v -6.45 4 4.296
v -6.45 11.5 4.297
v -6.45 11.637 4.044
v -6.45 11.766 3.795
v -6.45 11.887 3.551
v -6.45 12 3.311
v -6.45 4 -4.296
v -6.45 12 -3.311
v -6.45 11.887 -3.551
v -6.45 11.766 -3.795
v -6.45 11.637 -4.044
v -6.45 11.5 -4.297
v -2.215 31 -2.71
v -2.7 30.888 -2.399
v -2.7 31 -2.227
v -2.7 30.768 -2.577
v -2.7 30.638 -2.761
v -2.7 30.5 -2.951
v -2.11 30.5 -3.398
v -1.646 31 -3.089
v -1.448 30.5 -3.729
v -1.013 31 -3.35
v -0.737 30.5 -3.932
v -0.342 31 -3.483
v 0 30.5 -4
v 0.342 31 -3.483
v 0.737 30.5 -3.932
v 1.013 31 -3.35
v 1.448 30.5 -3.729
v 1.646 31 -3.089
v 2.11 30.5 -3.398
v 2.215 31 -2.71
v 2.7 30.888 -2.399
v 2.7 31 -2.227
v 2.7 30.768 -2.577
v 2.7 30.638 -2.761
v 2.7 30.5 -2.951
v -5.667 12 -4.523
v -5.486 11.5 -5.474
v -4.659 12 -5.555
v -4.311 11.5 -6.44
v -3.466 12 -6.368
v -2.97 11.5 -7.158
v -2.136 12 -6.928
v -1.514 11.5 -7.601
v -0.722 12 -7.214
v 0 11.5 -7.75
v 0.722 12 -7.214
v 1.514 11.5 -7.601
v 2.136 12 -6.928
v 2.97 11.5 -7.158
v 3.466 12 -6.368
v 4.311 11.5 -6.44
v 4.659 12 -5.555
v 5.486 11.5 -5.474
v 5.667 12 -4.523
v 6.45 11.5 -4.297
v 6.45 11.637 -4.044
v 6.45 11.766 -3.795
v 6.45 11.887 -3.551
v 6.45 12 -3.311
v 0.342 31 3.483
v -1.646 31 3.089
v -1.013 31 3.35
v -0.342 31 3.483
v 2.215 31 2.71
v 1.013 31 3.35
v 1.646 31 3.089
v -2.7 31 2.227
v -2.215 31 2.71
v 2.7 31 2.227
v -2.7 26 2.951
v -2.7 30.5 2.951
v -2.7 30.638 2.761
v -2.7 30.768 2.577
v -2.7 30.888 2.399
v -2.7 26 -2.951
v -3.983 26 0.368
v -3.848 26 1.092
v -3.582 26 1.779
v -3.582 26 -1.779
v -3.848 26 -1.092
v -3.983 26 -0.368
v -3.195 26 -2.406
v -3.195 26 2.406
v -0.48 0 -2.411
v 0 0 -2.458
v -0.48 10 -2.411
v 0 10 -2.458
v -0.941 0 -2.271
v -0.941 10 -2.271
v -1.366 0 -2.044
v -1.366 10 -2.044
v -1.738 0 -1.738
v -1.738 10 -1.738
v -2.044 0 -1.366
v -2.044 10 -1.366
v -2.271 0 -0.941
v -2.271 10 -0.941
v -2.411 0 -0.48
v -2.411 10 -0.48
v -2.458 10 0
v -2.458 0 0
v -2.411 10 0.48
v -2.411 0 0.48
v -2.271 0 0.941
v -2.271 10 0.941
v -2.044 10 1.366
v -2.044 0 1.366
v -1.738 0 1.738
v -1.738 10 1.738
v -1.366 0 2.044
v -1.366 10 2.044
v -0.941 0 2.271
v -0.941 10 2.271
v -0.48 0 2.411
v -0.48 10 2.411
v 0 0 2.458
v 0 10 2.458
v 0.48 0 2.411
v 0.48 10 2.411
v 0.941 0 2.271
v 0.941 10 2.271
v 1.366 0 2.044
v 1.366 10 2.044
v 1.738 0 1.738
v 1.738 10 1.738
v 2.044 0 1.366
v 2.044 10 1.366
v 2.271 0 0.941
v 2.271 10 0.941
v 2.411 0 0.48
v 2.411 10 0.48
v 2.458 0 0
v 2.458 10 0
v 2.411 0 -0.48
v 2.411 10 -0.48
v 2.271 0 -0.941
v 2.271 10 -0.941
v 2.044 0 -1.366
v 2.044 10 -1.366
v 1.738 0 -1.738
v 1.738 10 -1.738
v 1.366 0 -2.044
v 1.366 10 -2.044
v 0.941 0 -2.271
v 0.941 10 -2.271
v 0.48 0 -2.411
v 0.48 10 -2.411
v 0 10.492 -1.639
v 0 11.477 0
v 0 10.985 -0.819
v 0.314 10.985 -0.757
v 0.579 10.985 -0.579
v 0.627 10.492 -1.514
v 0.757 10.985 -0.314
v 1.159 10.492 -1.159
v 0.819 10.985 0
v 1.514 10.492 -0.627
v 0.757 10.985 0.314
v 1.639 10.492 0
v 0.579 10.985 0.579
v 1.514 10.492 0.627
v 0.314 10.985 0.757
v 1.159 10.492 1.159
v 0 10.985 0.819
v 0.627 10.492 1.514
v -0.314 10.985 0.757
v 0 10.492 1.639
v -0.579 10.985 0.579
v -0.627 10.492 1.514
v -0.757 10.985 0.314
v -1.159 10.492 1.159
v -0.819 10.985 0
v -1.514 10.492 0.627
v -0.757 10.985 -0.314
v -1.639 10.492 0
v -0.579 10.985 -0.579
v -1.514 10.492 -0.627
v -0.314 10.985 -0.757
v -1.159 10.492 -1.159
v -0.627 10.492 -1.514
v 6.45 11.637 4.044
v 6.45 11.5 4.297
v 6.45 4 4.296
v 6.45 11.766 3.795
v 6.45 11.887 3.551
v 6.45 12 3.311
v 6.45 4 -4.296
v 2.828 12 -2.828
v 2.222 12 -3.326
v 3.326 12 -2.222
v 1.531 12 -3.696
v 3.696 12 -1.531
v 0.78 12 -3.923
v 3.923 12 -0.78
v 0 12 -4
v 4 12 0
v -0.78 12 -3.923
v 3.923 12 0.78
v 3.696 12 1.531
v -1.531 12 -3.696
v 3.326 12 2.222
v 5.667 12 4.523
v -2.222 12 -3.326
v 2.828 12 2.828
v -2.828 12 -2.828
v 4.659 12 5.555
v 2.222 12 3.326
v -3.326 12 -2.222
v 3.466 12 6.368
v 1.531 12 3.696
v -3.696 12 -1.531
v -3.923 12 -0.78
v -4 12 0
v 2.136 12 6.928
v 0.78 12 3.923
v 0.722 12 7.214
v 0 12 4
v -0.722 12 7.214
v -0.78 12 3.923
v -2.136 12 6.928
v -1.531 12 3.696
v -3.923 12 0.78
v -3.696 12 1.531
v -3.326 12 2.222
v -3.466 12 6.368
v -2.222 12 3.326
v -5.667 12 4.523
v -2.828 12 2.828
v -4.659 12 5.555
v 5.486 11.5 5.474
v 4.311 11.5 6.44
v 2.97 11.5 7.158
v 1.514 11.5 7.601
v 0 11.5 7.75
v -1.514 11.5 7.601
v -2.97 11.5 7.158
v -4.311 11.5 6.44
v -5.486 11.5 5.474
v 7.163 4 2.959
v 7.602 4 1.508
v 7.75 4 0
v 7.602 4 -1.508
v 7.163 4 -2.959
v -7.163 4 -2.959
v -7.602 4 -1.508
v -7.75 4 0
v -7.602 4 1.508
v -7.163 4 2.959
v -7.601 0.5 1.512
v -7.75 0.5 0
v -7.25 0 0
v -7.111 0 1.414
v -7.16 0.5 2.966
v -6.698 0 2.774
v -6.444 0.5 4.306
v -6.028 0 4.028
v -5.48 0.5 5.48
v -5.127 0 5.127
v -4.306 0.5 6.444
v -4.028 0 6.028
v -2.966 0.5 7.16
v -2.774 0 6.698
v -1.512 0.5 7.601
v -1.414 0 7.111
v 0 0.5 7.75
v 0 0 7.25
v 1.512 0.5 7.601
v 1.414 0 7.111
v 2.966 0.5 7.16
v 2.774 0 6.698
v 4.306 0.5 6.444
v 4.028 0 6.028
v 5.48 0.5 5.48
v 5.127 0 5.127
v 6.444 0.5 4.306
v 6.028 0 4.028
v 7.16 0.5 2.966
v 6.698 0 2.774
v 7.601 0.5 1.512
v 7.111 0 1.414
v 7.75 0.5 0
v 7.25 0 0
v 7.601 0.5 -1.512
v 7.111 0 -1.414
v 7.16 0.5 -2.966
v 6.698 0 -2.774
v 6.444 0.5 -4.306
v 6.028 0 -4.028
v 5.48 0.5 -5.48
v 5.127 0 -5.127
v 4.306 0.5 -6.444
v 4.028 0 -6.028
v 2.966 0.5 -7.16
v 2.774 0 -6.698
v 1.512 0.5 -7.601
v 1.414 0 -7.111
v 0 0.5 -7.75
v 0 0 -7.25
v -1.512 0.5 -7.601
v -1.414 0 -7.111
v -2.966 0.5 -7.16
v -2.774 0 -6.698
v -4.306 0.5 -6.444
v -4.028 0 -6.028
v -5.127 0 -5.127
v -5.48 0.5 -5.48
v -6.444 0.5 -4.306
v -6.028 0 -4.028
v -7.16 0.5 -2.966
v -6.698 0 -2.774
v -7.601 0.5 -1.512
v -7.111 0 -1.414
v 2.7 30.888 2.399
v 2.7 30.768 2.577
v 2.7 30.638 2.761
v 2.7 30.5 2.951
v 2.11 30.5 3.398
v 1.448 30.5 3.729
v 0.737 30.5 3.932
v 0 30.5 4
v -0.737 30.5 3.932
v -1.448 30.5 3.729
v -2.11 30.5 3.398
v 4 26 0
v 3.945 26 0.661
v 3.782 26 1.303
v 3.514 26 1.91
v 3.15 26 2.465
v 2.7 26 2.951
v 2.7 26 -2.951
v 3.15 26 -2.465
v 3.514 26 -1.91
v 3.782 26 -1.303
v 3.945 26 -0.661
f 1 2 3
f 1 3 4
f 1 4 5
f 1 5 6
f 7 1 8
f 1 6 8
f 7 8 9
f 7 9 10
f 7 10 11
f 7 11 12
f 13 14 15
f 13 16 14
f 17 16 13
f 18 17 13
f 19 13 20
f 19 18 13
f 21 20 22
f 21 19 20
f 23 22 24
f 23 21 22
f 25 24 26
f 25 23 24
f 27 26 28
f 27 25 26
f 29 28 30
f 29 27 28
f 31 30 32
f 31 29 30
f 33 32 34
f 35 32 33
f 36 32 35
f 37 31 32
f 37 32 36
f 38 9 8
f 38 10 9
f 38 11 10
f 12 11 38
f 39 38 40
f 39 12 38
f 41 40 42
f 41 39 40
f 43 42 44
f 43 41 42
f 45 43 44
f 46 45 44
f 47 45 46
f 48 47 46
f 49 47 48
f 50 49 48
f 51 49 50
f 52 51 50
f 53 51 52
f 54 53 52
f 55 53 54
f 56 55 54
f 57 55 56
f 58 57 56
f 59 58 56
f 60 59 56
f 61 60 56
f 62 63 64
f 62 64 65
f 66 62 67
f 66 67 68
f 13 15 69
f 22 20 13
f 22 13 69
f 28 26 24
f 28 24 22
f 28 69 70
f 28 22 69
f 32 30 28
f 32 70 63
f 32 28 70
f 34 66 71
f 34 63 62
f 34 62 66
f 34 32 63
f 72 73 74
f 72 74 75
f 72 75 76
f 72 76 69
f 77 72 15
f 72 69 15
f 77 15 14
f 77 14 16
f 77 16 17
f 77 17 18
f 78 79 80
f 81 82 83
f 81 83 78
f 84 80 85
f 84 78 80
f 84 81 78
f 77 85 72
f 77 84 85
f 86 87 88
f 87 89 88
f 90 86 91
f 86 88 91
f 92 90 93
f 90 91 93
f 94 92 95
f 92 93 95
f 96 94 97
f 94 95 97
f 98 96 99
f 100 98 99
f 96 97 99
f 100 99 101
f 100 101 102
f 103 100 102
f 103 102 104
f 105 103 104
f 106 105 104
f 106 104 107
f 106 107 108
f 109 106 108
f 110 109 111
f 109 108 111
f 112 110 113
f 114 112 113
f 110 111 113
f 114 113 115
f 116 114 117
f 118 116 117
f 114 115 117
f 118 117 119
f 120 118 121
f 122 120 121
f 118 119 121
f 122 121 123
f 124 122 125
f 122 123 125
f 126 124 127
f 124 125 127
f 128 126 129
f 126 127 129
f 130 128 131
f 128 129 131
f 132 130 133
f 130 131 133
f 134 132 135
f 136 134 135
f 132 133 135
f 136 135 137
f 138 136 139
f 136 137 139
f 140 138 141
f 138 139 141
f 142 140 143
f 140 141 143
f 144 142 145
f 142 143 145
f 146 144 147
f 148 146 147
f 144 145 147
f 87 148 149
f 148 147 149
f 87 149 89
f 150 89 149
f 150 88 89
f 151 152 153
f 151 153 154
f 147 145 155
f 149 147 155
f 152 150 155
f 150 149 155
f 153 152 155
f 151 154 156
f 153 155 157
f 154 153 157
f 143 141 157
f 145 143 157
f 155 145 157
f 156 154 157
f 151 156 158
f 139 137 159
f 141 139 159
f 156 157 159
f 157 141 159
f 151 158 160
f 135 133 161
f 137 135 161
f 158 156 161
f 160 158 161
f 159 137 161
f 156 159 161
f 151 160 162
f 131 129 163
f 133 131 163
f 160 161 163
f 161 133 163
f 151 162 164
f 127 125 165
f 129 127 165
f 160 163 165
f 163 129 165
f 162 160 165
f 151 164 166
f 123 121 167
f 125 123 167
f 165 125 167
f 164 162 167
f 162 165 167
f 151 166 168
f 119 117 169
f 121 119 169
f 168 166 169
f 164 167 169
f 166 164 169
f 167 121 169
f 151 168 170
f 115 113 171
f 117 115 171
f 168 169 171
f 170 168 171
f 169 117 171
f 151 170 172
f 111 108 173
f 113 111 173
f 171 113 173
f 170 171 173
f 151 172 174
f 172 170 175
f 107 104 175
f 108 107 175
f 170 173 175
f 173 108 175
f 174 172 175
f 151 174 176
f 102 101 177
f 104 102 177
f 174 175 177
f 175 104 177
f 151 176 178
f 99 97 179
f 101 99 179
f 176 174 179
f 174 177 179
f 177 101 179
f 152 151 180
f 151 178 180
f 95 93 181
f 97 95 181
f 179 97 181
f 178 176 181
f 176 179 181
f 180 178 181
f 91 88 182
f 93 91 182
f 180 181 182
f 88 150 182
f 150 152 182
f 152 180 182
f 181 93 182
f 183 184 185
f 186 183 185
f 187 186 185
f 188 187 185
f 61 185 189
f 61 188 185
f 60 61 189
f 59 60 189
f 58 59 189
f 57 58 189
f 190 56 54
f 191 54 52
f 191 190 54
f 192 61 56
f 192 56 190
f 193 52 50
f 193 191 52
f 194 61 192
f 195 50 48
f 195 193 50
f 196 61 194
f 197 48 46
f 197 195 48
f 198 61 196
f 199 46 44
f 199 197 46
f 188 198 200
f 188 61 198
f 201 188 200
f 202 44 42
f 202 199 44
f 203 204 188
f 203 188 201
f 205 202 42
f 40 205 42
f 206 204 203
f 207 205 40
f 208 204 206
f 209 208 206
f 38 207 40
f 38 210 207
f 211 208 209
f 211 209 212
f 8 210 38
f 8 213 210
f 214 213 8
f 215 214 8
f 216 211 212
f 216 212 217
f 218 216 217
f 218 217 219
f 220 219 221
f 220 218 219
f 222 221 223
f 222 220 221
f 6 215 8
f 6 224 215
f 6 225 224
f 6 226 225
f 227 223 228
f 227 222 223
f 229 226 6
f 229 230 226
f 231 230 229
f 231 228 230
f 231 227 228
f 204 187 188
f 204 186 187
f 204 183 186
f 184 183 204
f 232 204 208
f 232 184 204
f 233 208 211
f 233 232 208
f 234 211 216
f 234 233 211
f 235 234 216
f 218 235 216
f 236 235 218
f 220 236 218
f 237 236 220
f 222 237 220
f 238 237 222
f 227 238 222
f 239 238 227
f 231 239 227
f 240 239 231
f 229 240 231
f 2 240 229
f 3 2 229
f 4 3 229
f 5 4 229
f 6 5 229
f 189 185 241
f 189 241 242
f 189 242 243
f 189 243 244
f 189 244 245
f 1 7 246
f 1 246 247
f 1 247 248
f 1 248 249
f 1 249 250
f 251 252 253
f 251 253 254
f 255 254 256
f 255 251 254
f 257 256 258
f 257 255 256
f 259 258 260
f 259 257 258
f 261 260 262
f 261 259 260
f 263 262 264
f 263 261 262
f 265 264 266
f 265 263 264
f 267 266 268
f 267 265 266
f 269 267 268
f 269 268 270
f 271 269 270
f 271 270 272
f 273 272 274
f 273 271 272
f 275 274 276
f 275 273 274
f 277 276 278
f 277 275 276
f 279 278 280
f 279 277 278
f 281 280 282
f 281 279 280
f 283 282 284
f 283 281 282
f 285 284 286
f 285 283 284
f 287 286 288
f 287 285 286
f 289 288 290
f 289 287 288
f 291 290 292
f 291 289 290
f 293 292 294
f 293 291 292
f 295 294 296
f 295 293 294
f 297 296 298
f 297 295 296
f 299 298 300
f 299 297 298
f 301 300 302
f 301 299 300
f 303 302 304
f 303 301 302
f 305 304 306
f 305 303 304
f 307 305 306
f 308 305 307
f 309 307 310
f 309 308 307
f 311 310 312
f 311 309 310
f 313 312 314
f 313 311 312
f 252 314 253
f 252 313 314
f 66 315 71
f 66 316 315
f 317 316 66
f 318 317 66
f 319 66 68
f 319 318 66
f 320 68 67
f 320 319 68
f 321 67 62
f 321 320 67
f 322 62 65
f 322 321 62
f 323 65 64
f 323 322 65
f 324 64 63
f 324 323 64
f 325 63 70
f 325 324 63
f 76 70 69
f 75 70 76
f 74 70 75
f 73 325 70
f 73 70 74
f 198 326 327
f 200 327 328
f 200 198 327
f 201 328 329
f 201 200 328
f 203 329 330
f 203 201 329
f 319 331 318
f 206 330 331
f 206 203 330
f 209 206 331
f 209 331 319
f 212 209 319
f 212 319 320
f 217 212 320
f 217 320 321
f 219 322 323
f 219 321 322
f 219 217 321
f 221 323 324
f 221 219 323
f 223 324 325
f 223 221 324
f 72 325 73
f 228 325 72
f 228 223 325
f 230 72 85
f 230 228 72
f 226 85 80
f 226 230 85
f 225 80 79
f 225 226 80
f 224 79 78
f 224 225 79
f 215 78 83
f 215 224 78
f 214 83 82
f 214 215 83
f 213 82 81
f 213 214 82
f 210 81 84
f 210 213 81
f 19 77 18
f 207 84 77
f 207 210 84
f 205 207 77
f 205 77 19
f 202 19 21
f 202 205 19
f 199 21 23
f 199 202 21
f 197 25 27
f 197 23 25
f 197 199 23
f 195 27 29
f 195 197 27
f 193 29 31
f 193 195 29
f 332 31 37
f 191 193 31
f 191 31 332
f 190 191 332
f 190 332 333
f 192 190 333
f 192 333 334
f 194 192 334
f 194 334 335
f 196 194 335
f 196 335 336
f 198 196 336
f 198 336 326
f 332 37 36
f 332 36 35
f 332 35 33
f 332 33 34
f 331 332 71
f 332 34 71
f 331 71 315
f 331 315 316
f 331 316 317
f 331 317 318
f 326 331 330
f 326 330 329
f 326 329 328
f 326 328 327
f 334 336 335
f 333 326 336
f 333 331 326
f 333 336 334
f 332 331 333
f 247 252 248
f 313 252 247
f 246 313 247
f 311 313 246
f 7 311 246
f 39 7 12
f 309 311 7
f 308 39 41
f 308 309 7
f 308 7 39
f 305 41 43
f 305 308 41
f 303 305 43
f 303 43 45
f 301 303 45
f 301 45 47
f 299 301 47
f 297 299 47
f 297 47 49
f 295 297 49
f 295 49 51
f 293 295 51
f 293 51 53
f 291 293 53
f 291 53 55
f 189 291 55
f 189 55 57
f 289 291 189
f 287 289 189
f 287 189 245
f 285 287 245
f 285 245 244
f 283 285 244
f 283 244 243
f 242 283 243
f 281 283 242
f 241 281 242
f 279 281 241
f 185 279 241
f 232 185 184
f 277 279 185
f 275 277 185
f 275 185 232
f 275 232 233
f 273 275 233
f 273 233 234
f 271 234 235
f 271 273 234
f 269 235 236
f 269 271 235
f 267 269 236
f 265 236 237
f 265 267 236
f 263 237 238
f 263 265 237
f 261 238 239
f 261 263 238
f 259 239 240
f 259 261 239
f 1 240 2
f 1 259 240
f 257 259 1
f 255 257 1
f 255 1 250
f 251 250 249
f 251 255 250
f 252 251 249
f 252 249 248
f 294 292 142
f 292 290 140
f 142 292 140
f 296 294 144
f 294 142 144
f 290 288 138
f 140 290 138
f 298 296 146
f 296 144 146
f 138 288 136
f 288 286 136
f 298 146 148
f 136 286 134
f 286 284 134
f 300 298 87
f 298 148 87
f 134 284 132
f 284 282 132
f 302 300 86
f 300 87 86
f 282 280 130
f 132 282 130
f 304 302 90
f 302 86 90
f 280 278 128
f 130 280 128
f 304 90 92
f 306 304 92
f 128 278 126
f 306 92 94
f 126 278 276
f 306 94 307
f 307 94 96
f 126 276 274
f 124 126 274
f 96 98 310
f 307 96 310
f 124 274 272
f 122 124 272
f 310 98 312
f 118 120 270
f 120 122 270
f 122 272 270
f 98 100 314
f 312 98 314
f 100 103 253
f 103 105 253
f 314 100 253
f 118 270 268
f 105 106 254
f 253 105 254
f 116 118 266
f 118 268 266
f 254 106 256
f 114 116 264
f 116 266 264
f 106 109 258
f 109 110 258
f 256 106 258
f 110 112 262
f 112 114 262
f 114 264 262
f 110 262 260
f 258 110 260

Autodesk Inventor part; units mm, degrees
ref_plane "YZ Plane" through (0, 0, 0) normal (1, 0, 0) x (0, 1, 0)
ref_plane "XZ Plane" through (0, 0, 0) normal (0, 1, 0) x (-1, 0, 0)
ref_plane "XY Plane" through (0, 0, 0) normal (0, 0, 1) x (1, 0, 0)
sketch "Sketch1" plane through (0, 0, 0) normal (0, 1, 0) x (-1, 0, 0)
  circle A0 centre (0, 0) radius 7.75
  dimension "d0" = 15.5
extrude "Extrusion1" add sketch "Sketch1" along normal blind 12
sketch "Sketch2" plane through (0, 12, 0) normal (0, 1, 0) x (1, 0, 0)
  circle A0 centre (0, 0) radius 7.75 projected
  circle A1 centre (0, 0) radius 7.75 projected
  line L0 (-6.45, -4.2965) -> (-6.45, 4.2965)
  line L1 (6.45, -4.2965) -> (6.45, 4.2965)
  line L2 (0, -12.5996) -> (0, 16.4995) construction
  dimension "d3" = 12.9
extrude "Extrusion2" cut sketch "Sketch2" against normal blind 8 contours A0 L1 | L0 A0
sketch "Sketch3" plane through (0, 12, 0) normal (0, 1, 0) x (1, 0, 0)
  circle A0 centre (0, 0) radius 4
  dimension "d6" = 8
extrude "Extrusion3" add sketch "Sketch3" along normal blind 19
chamfer "Chamfer1" distance 0.5 angle 45 1 edges at (-4, 31, 0)
thread "Thread1" size "M8x1.25" class "6g" standard "ANSI Metric M Profile" length 16
chamfer "Chamfer2" distance 0.5 angle 45 3 edges at (0, 12, 7.75) (0, 12, -7.75) (7.75, 0, 0)
sketch "Sketch4" plane through (0, 0, 0) normal (0, -1, 0) x (1, 0, 0)
  point P0 (0, 0)
  point P1 (0, 0)
hole "Hole1" at (0, 0, 0) direction (0, 1, 0) diameter 4.917 depth 10 tip angle 118 thread size "M6x1" class "6H" standard "ISO Metric profile"
sketch "Sketch6" plane through (0, 31, 0) normal (0, 1, 0) x (1, 0, 0)
  circle A0 centre (0, 0) radius 4 projected
  line L0 (2.7, -4) -> (-2.7, -4)
  line L1 (-2.7, -4) -> (-2.7, 4)
  line L2 (-2.7, 4) -> (2.7, 4)
  line L3 (2.7, 4) -> (2.7, -4)
  line L4 (2.7, -4) -> (-2.7, 4) construction
  line L5 (-2.7, -4) -> (2.7, 4) construction
  point P0 (-2.7, -2.9513)
  point P1 (-2.7, 2.9513)
  point P2 (2.7, 2.9513)
  point P3 (2.7, -2.9513)
  dimension "d27" = 5.4
extrude "Extrusion5" cut sketch "Sketch6" against normal blind 5 contours A0 L3 | L1 A0
properties part number "Box Fixing Stud"
